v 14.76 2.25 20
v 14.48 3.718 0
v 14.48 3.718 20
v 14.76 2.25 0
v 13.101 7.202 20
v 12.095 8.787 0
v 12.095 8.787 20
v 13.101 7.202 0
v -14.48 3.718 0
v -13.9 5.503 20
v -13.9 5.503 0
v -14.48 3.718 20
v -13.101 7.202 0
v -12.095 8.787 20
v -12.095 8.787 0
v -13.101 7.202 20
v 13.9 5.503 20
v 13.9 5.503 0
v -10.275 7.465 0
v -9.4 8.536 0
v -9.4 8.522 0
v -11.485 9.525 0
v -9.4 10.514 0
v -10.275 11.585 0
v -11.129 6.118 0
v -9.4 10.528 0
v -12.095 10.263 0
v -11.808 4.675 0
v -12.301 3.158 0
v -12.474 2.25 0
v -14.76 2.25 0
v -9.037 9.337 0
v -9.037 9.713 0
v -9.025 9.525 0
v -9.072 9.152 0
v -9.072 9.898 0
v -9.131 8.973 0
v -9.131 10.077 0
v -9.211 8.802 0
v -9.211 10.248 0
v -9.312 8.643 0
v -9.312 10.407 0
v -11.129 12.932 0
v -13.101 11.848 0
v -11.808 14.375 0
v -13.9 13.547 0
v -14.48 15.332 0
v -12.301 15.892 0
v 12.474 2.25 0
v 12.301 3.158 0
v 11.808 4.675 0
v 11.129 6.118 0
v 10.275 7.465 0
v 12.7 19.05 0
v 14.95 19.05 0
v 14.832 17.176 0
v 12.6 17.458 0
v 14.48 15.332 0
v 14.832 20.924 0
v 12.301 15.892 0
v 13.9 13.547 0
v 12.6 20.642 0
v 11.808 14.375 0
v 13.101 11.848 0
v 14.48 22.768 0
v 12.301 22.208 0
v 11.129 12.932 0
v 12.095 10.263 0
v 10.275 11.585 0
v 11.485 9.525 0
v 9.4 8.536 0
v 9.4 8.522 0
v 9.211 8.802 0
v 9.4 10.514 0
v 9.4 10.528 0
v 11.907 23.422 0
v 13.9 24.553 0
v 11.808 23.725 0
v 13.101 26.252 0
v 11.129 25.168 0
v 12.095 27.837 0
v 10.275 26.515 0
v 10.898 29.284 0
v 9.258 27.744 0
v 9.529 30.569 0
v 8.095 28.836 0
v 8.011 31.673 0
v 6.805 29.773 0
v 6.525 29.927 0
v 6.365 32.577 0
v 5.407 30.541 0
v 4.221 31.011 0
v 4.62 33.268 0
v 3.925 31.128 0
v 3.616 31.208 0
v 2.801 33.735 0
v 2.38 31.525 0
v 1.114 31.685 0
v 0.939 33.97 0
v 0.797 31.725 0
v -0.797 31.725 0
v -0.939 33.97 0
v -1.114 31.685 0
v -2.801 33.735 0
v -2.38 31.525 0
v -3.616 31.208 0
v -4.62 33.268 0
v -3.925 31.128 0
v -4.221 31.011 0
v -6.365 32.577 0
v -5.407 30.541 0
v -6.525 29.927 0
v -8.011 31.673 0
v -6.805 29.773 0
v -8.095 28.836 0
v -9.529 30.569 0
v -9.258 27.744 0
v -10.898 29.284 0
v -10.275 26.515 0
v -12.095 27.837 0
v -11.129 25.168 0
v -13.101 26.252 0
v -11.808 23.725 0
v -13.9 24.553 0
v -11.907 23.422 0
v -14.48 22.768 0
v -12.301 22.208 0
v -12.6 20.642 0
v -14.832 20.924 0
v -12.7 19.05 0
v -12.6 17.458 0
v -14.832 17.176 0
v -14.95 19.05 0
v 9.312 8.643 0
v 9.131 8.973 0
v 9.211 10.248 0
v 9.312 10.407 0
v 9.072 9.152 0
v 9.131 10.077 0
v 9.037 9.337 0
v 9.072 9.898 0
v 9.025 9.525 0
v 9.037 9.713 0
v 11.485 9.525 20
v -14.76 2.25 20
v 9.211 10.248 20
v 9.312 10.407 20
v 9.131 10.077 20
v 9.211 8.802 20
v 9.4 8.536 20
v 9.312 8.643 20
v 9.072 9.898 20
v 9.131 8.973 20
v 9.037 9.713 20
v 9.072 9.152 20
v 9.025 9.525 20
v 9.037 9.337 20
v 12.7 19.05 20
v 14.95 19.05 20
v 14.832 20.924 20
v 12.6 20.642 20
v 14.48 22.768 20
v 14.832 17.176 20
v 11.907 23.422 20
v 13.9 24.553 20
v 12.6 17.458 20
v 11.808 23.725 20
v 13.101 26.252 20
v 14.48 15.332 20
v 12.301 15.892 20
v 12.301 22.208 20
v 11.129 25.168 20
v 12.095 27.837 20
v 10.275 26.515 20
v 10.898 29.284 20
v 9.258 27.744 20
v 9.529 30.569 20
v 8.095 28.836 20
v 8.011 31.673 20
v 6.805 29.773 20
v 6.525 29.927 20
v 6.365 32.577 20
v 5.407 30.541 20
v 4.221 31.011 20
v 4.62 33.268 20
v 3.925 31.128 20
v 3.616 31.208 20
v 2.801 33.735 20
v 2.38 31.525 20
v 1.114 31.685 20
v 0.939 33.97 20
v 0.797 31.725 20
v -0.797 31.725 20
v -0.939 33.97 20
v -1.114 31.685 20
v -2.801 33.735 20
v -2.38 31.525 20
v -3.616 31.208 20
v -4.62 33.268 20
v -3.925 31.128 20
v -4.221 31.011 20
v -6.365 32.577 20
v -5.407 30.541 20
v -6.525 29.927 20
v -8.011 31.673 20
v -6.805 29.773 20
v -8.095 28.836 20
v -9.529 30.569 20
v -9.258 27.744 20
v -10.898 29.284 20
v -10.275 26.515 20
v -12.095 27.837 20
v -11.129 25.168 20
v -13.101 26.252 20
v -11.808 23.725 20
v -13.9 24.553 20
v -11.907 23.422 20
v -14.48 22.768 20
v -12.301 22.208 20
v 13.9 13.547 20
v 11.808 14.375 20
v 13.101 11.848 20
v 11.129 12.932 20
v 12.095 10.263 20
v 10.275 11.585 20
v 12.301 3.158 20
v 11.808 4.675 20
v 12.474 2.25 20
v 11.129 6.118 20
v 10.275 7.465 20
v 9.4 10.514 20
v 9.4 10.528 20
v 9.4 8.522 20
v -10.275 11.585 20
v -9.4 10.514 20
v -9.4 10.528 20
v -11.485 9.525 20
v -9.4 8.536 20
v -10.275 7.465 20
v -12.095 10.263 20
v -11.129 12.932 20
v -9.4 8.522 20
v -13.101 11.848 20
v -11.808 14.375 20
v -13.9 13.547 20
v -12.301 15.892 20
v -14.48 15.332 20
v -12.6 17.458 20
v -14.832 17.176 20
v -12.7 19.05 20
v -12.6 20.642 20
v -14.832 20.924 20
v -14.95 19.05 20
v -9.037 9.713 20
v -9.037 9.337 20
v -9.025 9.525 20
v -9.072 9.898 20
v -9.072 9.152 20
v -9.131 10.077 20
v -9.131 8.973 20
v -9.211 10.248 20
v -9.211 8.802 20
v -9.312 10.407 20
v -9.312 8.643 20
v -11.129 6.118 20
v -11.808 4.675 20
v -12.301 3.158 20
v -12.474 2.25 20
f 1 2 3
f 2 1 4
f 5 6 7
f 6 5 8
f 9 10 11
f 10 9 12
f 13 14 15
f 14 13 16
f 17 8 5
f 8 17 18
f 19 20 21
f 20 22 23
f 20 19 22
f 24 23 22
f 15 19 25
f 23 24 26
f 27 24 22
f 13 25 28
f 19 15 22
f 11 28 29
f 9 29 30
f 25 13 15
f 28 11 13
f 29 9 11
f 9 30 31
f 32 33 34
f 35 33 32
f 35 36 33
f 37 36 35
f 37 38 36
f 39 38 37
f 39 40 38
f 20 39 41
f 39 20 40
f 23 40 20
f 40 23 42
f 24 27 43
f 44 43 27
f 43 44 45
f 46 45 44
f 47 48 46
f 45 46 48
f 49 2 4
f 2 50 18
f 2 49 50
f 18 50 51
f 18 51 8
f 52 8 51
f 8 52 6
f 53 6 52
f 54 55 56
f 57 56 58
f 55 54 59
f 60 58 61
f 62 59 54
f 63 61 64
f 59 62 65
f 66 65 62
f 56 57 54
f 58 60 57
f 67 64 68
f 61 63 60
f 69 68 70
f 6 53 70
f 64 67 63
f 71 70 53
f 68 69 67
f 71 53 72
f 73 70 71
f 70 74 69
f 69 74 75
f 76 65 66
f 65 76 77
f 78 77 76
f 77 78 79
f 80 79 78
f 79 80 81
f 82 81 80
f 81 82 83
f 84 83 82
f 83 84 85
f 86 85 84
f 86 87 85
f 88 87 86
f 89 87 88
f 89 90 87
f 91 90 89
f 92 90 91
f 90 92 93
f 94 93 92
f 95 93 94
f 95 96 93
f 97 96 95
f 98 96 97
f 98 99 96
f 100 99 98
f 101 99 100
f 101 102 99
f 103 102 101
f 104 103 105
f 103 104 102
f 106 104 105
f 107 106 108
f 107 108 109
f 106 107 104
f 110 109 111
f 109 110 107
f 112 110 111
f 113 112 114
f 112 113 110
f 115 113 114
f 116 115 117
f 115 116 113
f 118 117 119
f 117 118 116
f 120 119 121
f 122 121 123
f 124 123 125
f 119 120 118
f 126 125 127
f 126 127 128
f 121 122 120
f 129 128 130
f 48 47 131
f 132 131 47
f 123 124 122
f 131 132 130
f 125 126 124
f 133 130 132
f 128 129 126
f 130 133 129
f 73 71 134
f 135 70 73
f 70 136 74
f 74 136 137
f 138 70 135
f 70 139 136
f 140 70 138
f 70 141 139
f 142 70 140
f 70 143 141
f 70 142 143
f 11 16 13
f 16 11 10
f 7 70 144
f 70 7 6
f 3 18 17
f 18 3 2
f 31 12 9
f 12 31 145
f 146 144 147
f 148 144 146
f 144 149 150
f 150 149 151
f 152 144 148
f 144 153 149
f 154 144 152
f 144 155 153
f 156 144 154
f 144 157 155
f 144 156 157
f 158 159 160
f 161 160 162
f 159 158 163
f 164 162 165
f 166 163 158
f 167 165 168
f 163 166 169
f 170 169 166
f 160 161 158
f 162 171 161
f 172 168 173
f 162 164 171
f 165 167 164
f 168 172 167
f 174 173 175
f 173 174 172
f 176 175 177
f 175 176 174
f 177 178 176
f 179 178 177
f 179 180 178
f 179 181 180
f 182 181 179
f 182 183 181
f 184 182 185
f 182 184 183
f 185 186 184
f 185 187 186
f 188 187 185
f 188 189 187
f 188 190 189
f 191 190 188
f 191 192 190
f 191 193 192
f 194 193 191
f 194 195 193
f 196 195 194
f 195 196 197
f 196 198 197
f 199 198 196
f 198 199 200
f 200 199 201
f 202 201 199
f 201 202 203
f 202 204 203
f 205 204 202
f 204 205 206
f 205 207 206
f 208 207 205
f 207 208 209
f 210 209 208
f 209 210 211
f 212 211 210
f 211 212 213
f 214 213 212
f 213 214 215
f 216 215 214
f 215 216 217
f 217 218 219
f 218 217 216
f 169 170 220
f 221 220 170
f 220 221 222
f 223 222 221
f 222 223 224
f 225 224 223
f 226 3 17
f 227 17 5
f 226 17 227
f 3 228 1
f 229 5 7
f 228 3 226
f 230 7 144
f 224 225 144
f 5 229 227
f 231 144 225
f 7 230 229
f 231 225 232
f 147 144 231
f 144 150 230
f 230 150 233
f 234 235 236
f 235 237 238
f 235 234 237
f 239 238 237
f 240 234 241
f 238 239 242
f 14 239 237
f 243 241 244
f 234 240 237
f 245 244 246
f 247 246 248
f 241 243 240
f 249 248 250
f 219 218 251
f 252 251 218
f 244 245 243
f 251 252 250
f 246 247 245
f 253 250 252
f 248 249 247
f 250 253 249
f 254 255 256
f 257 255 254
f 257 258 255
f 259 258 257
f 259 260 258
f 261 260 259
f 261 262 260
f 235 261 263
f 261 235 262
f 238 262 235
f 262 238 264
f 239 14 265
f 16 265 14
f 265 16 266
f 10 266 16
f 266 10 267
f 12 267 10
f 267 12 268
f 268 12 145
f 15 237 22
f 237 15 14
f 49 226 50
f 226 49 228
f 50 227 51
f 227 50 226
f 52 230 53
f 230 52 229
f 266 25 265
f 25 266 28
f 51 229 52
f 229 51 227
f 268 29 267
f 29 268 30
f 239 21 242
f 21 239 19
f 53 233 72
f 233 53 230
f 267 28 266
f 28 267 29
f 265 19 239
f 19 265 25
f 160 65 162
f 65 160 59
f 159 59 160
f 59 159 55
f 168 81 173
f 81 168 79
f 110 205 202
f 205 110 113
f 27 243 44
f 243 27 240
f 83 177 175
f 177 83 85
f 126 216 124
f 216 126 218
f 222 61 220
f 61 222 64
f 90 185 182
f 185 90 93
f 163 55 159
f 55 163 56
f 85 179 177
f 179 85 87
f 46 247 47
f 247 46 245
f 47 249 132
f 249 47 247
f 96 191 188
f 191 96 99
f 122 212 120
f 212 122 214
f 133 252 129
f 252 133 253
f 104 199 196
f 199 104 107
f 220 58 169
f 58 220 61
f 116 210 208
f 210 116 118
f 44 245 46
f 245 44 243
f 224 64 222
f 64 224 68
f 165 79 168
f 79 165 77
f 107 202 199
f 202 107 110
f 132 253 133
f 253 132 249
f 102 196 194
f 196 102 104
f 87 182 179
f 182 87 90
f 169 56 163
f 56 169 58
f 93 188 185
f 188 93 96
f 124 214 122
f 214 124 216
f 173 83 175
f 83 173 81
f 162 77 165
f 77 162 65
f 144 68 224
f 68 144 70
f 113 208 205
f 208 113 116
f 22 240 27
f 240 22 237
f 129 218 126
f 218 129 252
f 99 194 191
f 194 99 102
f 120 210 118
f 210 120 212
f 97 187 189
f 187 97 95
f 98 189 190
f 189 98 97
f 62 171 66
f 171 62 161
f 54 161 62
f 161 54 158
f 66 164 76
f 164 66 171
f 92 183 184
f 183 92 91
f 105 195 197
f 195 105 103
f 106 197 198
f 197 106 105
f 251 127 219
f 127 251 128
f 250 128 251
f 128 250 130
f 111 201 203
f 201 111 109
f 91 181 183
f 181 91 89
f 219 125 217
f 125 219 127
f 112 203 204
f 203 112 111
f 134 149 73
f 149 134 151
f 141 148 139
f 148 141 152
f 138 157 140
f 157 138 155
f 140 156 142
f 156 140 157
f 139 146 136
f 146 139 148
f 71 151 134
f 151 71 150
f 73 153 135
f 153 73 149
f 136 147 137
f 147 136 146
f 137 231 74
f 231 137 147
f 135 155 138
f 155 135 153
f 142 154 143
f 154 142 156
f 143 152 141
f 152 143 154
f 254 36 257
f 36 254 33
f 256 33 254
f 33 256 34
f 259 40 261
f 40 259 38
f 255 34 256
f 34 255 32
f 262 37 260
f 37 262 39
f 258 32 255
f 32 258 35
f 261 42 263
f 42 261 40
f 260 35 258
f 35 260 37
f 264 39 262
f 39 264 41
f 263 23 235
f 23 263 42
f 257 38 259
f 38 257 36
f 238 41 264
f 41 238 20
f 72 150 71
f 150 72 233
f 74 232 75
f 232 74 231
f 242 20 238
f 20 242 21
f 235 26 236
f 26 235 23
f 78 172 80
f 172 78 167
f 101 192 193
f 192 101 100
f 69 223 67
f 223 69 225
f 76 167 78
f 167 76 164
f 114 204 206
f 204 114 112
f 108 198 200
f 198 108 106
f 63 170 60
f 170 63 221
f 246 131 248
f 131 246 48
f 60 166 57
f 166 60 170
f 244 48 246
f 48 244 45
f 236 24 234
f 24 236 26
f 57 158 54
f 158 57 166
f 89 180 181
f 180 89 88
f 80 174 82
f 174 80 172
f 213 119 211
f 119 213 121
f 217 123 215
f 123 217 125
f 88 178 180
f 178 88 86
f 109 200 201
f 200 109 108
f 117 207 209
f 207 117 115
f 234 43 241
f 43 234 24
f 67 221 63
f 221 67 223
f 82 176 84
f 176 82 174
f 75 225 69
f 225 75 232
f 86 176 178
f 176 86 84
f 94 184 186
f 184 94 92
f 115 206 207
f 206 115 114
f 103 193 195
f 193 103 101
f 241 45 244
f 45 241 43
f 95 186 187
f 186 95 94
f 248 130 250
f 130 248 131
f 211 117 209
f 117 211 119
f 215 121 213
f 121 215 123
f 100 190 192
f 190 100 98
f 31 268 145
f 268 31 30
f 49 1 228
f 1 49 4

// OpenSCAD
// License:  Creative Commons Attribtion-NonCommercial-ShareAlike
// http://creativecommons.org/licenses/by-nc-sa/3.0/legalcode
//
// Author: Jetty, 7th July, 2012
//
// Modified by Thomas Kircher, May 25, 2017
//
// U Clip, to clip sheeting to PVC piping

quantity = 1;

insideDiameter = 25.4;
thickness = 2.25;
length = 20;
flangeDistanceMult = 0.75;
flangeTerminateMult = 0.5;
manifoldCorrection = 0.04;
extra_chamfer = 0;

$fn = 50;

cubeSize = insideDiameter + thickness * 2;
distanceBetween = insideDiameter + thickness * 2 + 3;

 // Generate clips
 if(quantity > 0) {
     // Find the size of the smallest square that fits the quantity
     grid_size = ceil(sqrt(quantity));
     
     // Fill the square in row order
     for(n = [0 : quantity - 1]) {
         translate( [floor(n % grid_size) * distanceBetween,
                     floor(n / grid_size) * distanceBetween, 0] )
         pvcClip();
     }
 }
 
// Creates a Pvc Clip
module pvcClip()
{
	difference()
	{
		union()
		{
            // Clip ends
			hollowCylinder( insideDiameter / 2 + thickness, length, thickness );
		
            // Clip body
			translate( [0, flangeDistanceMult * insideDiameter, 0] )
				hollowCylinder( insideDiameter / 2 + thickness, length, thickness );
		}

        // Cutouts for clip body interior
		translate( [0, 0, -manifoldCorrection] )
			cylinder( r = insideDiameter / 2, h = length + manifoldCorrection * 2 );

		translate( [0, flangeDistanceMult * insideDiameter, -manifoldCorrection] )
			cylinder( r = insideDiameter / 2, h = length + manifoldCorrection * 2 );

        // Cutout for clip ends
		translate( [-cubeSize / 2, -cubeSize / 2 - insideDiameter * flangeTerminateMult, -manifoldCorrection] )
			cube( [cubeSize, cubeSize, length + manifoldCorrection * 2] );
        
        // Smoothing stabby bits
        chamfer_stabby_bits();
	}
}

// Chamfer the inner edge of a cylinder
module torus_chamfer()
{
    difference() {
        rotate_extrude($fn = 50)
            translate([insideDiameter / 2 - 1, 0, 0])
                square([2, 2]);
    
        rotate_extrude($fn = 50)
            translate([insideDiameter / 2 + 1, 2, 0])
                circle(r = 1, $fn = 50);
        }
}

// Put a slight chamfer on the sharp inside bits, to keep garden fabric from ripping
module chamfer_stabby_bits()
{
    // Chamfer the inner top and bottom parts of the cylinders.
    if(extra_chamfer == 1) {
        // Bottom of clip handle
        translate( [0, 0, -1] )
            torus_chamfer();

        // Top of clip handle
        translate( [0, 0, length + 1] )
            rotate( [0, 180, 0] )
                torus_chamfer();

        // Bottom of clip body
        translate( [0, flangeDistanceMult * insideDiameter, -1] )
            torus_chamfer();

        // Top of clip body
        translate( [0, flangeDistanceMult * insideDiameter, length + 1] )
            rotate([0, 180, 0])
                torus_chamfer();
    }
    
    chamfer_diameter = 2.5;
    cube_side = chamfer_diameter * 2 + manifoldCorrection;

    y_offset = flangeDistanceMult * insideDiameter / 2;
    x_offset = insideDiameter / 2 * sqrt(1 - flangeDistanceMult * flangeDistanceMult);
    
    difference() {
        union() {
            translate([x_offset + chamfer_diameter * 0.85, y_offset, -manifoldCorrection])
                hollowCylinder(chamfer_diameter, length + manifoldCorrection * 2, 1.0);
    
            translate([-x_offset - chamfer_diameter * 0.85, y_offset, -manifoldCorrection])
                hollowCylinder(chamfer_diameter, length + manifoldCorrection * 2, 1.0);
        }
        
        union() {
            translate([x_offset + 1.0, y_offset - cube_side / 2, -manifoldCorrection * 2])
                cube( [cube_side, cube_side, length + manifoldCorrection * 4]);
            
            translate([-x_offset - cube_side - 1.0, y_offset - cube_side / 2, -manifoldCorrection * 2])
                cube([cube_side, cube_side, length + manifoldCorrection * 4]);
        }
    }
}

// Creates a hollow cylinder
module hollowCylinder(radius, height, thickness)
{
	difference()
	{
		cylinder( r = radius, h = height );
		translate( [0, 0, -manifoldCorrection] )
			cylinder( r = radius - thickness, h = height + manifoldCorrection * 2 );
	}
}
